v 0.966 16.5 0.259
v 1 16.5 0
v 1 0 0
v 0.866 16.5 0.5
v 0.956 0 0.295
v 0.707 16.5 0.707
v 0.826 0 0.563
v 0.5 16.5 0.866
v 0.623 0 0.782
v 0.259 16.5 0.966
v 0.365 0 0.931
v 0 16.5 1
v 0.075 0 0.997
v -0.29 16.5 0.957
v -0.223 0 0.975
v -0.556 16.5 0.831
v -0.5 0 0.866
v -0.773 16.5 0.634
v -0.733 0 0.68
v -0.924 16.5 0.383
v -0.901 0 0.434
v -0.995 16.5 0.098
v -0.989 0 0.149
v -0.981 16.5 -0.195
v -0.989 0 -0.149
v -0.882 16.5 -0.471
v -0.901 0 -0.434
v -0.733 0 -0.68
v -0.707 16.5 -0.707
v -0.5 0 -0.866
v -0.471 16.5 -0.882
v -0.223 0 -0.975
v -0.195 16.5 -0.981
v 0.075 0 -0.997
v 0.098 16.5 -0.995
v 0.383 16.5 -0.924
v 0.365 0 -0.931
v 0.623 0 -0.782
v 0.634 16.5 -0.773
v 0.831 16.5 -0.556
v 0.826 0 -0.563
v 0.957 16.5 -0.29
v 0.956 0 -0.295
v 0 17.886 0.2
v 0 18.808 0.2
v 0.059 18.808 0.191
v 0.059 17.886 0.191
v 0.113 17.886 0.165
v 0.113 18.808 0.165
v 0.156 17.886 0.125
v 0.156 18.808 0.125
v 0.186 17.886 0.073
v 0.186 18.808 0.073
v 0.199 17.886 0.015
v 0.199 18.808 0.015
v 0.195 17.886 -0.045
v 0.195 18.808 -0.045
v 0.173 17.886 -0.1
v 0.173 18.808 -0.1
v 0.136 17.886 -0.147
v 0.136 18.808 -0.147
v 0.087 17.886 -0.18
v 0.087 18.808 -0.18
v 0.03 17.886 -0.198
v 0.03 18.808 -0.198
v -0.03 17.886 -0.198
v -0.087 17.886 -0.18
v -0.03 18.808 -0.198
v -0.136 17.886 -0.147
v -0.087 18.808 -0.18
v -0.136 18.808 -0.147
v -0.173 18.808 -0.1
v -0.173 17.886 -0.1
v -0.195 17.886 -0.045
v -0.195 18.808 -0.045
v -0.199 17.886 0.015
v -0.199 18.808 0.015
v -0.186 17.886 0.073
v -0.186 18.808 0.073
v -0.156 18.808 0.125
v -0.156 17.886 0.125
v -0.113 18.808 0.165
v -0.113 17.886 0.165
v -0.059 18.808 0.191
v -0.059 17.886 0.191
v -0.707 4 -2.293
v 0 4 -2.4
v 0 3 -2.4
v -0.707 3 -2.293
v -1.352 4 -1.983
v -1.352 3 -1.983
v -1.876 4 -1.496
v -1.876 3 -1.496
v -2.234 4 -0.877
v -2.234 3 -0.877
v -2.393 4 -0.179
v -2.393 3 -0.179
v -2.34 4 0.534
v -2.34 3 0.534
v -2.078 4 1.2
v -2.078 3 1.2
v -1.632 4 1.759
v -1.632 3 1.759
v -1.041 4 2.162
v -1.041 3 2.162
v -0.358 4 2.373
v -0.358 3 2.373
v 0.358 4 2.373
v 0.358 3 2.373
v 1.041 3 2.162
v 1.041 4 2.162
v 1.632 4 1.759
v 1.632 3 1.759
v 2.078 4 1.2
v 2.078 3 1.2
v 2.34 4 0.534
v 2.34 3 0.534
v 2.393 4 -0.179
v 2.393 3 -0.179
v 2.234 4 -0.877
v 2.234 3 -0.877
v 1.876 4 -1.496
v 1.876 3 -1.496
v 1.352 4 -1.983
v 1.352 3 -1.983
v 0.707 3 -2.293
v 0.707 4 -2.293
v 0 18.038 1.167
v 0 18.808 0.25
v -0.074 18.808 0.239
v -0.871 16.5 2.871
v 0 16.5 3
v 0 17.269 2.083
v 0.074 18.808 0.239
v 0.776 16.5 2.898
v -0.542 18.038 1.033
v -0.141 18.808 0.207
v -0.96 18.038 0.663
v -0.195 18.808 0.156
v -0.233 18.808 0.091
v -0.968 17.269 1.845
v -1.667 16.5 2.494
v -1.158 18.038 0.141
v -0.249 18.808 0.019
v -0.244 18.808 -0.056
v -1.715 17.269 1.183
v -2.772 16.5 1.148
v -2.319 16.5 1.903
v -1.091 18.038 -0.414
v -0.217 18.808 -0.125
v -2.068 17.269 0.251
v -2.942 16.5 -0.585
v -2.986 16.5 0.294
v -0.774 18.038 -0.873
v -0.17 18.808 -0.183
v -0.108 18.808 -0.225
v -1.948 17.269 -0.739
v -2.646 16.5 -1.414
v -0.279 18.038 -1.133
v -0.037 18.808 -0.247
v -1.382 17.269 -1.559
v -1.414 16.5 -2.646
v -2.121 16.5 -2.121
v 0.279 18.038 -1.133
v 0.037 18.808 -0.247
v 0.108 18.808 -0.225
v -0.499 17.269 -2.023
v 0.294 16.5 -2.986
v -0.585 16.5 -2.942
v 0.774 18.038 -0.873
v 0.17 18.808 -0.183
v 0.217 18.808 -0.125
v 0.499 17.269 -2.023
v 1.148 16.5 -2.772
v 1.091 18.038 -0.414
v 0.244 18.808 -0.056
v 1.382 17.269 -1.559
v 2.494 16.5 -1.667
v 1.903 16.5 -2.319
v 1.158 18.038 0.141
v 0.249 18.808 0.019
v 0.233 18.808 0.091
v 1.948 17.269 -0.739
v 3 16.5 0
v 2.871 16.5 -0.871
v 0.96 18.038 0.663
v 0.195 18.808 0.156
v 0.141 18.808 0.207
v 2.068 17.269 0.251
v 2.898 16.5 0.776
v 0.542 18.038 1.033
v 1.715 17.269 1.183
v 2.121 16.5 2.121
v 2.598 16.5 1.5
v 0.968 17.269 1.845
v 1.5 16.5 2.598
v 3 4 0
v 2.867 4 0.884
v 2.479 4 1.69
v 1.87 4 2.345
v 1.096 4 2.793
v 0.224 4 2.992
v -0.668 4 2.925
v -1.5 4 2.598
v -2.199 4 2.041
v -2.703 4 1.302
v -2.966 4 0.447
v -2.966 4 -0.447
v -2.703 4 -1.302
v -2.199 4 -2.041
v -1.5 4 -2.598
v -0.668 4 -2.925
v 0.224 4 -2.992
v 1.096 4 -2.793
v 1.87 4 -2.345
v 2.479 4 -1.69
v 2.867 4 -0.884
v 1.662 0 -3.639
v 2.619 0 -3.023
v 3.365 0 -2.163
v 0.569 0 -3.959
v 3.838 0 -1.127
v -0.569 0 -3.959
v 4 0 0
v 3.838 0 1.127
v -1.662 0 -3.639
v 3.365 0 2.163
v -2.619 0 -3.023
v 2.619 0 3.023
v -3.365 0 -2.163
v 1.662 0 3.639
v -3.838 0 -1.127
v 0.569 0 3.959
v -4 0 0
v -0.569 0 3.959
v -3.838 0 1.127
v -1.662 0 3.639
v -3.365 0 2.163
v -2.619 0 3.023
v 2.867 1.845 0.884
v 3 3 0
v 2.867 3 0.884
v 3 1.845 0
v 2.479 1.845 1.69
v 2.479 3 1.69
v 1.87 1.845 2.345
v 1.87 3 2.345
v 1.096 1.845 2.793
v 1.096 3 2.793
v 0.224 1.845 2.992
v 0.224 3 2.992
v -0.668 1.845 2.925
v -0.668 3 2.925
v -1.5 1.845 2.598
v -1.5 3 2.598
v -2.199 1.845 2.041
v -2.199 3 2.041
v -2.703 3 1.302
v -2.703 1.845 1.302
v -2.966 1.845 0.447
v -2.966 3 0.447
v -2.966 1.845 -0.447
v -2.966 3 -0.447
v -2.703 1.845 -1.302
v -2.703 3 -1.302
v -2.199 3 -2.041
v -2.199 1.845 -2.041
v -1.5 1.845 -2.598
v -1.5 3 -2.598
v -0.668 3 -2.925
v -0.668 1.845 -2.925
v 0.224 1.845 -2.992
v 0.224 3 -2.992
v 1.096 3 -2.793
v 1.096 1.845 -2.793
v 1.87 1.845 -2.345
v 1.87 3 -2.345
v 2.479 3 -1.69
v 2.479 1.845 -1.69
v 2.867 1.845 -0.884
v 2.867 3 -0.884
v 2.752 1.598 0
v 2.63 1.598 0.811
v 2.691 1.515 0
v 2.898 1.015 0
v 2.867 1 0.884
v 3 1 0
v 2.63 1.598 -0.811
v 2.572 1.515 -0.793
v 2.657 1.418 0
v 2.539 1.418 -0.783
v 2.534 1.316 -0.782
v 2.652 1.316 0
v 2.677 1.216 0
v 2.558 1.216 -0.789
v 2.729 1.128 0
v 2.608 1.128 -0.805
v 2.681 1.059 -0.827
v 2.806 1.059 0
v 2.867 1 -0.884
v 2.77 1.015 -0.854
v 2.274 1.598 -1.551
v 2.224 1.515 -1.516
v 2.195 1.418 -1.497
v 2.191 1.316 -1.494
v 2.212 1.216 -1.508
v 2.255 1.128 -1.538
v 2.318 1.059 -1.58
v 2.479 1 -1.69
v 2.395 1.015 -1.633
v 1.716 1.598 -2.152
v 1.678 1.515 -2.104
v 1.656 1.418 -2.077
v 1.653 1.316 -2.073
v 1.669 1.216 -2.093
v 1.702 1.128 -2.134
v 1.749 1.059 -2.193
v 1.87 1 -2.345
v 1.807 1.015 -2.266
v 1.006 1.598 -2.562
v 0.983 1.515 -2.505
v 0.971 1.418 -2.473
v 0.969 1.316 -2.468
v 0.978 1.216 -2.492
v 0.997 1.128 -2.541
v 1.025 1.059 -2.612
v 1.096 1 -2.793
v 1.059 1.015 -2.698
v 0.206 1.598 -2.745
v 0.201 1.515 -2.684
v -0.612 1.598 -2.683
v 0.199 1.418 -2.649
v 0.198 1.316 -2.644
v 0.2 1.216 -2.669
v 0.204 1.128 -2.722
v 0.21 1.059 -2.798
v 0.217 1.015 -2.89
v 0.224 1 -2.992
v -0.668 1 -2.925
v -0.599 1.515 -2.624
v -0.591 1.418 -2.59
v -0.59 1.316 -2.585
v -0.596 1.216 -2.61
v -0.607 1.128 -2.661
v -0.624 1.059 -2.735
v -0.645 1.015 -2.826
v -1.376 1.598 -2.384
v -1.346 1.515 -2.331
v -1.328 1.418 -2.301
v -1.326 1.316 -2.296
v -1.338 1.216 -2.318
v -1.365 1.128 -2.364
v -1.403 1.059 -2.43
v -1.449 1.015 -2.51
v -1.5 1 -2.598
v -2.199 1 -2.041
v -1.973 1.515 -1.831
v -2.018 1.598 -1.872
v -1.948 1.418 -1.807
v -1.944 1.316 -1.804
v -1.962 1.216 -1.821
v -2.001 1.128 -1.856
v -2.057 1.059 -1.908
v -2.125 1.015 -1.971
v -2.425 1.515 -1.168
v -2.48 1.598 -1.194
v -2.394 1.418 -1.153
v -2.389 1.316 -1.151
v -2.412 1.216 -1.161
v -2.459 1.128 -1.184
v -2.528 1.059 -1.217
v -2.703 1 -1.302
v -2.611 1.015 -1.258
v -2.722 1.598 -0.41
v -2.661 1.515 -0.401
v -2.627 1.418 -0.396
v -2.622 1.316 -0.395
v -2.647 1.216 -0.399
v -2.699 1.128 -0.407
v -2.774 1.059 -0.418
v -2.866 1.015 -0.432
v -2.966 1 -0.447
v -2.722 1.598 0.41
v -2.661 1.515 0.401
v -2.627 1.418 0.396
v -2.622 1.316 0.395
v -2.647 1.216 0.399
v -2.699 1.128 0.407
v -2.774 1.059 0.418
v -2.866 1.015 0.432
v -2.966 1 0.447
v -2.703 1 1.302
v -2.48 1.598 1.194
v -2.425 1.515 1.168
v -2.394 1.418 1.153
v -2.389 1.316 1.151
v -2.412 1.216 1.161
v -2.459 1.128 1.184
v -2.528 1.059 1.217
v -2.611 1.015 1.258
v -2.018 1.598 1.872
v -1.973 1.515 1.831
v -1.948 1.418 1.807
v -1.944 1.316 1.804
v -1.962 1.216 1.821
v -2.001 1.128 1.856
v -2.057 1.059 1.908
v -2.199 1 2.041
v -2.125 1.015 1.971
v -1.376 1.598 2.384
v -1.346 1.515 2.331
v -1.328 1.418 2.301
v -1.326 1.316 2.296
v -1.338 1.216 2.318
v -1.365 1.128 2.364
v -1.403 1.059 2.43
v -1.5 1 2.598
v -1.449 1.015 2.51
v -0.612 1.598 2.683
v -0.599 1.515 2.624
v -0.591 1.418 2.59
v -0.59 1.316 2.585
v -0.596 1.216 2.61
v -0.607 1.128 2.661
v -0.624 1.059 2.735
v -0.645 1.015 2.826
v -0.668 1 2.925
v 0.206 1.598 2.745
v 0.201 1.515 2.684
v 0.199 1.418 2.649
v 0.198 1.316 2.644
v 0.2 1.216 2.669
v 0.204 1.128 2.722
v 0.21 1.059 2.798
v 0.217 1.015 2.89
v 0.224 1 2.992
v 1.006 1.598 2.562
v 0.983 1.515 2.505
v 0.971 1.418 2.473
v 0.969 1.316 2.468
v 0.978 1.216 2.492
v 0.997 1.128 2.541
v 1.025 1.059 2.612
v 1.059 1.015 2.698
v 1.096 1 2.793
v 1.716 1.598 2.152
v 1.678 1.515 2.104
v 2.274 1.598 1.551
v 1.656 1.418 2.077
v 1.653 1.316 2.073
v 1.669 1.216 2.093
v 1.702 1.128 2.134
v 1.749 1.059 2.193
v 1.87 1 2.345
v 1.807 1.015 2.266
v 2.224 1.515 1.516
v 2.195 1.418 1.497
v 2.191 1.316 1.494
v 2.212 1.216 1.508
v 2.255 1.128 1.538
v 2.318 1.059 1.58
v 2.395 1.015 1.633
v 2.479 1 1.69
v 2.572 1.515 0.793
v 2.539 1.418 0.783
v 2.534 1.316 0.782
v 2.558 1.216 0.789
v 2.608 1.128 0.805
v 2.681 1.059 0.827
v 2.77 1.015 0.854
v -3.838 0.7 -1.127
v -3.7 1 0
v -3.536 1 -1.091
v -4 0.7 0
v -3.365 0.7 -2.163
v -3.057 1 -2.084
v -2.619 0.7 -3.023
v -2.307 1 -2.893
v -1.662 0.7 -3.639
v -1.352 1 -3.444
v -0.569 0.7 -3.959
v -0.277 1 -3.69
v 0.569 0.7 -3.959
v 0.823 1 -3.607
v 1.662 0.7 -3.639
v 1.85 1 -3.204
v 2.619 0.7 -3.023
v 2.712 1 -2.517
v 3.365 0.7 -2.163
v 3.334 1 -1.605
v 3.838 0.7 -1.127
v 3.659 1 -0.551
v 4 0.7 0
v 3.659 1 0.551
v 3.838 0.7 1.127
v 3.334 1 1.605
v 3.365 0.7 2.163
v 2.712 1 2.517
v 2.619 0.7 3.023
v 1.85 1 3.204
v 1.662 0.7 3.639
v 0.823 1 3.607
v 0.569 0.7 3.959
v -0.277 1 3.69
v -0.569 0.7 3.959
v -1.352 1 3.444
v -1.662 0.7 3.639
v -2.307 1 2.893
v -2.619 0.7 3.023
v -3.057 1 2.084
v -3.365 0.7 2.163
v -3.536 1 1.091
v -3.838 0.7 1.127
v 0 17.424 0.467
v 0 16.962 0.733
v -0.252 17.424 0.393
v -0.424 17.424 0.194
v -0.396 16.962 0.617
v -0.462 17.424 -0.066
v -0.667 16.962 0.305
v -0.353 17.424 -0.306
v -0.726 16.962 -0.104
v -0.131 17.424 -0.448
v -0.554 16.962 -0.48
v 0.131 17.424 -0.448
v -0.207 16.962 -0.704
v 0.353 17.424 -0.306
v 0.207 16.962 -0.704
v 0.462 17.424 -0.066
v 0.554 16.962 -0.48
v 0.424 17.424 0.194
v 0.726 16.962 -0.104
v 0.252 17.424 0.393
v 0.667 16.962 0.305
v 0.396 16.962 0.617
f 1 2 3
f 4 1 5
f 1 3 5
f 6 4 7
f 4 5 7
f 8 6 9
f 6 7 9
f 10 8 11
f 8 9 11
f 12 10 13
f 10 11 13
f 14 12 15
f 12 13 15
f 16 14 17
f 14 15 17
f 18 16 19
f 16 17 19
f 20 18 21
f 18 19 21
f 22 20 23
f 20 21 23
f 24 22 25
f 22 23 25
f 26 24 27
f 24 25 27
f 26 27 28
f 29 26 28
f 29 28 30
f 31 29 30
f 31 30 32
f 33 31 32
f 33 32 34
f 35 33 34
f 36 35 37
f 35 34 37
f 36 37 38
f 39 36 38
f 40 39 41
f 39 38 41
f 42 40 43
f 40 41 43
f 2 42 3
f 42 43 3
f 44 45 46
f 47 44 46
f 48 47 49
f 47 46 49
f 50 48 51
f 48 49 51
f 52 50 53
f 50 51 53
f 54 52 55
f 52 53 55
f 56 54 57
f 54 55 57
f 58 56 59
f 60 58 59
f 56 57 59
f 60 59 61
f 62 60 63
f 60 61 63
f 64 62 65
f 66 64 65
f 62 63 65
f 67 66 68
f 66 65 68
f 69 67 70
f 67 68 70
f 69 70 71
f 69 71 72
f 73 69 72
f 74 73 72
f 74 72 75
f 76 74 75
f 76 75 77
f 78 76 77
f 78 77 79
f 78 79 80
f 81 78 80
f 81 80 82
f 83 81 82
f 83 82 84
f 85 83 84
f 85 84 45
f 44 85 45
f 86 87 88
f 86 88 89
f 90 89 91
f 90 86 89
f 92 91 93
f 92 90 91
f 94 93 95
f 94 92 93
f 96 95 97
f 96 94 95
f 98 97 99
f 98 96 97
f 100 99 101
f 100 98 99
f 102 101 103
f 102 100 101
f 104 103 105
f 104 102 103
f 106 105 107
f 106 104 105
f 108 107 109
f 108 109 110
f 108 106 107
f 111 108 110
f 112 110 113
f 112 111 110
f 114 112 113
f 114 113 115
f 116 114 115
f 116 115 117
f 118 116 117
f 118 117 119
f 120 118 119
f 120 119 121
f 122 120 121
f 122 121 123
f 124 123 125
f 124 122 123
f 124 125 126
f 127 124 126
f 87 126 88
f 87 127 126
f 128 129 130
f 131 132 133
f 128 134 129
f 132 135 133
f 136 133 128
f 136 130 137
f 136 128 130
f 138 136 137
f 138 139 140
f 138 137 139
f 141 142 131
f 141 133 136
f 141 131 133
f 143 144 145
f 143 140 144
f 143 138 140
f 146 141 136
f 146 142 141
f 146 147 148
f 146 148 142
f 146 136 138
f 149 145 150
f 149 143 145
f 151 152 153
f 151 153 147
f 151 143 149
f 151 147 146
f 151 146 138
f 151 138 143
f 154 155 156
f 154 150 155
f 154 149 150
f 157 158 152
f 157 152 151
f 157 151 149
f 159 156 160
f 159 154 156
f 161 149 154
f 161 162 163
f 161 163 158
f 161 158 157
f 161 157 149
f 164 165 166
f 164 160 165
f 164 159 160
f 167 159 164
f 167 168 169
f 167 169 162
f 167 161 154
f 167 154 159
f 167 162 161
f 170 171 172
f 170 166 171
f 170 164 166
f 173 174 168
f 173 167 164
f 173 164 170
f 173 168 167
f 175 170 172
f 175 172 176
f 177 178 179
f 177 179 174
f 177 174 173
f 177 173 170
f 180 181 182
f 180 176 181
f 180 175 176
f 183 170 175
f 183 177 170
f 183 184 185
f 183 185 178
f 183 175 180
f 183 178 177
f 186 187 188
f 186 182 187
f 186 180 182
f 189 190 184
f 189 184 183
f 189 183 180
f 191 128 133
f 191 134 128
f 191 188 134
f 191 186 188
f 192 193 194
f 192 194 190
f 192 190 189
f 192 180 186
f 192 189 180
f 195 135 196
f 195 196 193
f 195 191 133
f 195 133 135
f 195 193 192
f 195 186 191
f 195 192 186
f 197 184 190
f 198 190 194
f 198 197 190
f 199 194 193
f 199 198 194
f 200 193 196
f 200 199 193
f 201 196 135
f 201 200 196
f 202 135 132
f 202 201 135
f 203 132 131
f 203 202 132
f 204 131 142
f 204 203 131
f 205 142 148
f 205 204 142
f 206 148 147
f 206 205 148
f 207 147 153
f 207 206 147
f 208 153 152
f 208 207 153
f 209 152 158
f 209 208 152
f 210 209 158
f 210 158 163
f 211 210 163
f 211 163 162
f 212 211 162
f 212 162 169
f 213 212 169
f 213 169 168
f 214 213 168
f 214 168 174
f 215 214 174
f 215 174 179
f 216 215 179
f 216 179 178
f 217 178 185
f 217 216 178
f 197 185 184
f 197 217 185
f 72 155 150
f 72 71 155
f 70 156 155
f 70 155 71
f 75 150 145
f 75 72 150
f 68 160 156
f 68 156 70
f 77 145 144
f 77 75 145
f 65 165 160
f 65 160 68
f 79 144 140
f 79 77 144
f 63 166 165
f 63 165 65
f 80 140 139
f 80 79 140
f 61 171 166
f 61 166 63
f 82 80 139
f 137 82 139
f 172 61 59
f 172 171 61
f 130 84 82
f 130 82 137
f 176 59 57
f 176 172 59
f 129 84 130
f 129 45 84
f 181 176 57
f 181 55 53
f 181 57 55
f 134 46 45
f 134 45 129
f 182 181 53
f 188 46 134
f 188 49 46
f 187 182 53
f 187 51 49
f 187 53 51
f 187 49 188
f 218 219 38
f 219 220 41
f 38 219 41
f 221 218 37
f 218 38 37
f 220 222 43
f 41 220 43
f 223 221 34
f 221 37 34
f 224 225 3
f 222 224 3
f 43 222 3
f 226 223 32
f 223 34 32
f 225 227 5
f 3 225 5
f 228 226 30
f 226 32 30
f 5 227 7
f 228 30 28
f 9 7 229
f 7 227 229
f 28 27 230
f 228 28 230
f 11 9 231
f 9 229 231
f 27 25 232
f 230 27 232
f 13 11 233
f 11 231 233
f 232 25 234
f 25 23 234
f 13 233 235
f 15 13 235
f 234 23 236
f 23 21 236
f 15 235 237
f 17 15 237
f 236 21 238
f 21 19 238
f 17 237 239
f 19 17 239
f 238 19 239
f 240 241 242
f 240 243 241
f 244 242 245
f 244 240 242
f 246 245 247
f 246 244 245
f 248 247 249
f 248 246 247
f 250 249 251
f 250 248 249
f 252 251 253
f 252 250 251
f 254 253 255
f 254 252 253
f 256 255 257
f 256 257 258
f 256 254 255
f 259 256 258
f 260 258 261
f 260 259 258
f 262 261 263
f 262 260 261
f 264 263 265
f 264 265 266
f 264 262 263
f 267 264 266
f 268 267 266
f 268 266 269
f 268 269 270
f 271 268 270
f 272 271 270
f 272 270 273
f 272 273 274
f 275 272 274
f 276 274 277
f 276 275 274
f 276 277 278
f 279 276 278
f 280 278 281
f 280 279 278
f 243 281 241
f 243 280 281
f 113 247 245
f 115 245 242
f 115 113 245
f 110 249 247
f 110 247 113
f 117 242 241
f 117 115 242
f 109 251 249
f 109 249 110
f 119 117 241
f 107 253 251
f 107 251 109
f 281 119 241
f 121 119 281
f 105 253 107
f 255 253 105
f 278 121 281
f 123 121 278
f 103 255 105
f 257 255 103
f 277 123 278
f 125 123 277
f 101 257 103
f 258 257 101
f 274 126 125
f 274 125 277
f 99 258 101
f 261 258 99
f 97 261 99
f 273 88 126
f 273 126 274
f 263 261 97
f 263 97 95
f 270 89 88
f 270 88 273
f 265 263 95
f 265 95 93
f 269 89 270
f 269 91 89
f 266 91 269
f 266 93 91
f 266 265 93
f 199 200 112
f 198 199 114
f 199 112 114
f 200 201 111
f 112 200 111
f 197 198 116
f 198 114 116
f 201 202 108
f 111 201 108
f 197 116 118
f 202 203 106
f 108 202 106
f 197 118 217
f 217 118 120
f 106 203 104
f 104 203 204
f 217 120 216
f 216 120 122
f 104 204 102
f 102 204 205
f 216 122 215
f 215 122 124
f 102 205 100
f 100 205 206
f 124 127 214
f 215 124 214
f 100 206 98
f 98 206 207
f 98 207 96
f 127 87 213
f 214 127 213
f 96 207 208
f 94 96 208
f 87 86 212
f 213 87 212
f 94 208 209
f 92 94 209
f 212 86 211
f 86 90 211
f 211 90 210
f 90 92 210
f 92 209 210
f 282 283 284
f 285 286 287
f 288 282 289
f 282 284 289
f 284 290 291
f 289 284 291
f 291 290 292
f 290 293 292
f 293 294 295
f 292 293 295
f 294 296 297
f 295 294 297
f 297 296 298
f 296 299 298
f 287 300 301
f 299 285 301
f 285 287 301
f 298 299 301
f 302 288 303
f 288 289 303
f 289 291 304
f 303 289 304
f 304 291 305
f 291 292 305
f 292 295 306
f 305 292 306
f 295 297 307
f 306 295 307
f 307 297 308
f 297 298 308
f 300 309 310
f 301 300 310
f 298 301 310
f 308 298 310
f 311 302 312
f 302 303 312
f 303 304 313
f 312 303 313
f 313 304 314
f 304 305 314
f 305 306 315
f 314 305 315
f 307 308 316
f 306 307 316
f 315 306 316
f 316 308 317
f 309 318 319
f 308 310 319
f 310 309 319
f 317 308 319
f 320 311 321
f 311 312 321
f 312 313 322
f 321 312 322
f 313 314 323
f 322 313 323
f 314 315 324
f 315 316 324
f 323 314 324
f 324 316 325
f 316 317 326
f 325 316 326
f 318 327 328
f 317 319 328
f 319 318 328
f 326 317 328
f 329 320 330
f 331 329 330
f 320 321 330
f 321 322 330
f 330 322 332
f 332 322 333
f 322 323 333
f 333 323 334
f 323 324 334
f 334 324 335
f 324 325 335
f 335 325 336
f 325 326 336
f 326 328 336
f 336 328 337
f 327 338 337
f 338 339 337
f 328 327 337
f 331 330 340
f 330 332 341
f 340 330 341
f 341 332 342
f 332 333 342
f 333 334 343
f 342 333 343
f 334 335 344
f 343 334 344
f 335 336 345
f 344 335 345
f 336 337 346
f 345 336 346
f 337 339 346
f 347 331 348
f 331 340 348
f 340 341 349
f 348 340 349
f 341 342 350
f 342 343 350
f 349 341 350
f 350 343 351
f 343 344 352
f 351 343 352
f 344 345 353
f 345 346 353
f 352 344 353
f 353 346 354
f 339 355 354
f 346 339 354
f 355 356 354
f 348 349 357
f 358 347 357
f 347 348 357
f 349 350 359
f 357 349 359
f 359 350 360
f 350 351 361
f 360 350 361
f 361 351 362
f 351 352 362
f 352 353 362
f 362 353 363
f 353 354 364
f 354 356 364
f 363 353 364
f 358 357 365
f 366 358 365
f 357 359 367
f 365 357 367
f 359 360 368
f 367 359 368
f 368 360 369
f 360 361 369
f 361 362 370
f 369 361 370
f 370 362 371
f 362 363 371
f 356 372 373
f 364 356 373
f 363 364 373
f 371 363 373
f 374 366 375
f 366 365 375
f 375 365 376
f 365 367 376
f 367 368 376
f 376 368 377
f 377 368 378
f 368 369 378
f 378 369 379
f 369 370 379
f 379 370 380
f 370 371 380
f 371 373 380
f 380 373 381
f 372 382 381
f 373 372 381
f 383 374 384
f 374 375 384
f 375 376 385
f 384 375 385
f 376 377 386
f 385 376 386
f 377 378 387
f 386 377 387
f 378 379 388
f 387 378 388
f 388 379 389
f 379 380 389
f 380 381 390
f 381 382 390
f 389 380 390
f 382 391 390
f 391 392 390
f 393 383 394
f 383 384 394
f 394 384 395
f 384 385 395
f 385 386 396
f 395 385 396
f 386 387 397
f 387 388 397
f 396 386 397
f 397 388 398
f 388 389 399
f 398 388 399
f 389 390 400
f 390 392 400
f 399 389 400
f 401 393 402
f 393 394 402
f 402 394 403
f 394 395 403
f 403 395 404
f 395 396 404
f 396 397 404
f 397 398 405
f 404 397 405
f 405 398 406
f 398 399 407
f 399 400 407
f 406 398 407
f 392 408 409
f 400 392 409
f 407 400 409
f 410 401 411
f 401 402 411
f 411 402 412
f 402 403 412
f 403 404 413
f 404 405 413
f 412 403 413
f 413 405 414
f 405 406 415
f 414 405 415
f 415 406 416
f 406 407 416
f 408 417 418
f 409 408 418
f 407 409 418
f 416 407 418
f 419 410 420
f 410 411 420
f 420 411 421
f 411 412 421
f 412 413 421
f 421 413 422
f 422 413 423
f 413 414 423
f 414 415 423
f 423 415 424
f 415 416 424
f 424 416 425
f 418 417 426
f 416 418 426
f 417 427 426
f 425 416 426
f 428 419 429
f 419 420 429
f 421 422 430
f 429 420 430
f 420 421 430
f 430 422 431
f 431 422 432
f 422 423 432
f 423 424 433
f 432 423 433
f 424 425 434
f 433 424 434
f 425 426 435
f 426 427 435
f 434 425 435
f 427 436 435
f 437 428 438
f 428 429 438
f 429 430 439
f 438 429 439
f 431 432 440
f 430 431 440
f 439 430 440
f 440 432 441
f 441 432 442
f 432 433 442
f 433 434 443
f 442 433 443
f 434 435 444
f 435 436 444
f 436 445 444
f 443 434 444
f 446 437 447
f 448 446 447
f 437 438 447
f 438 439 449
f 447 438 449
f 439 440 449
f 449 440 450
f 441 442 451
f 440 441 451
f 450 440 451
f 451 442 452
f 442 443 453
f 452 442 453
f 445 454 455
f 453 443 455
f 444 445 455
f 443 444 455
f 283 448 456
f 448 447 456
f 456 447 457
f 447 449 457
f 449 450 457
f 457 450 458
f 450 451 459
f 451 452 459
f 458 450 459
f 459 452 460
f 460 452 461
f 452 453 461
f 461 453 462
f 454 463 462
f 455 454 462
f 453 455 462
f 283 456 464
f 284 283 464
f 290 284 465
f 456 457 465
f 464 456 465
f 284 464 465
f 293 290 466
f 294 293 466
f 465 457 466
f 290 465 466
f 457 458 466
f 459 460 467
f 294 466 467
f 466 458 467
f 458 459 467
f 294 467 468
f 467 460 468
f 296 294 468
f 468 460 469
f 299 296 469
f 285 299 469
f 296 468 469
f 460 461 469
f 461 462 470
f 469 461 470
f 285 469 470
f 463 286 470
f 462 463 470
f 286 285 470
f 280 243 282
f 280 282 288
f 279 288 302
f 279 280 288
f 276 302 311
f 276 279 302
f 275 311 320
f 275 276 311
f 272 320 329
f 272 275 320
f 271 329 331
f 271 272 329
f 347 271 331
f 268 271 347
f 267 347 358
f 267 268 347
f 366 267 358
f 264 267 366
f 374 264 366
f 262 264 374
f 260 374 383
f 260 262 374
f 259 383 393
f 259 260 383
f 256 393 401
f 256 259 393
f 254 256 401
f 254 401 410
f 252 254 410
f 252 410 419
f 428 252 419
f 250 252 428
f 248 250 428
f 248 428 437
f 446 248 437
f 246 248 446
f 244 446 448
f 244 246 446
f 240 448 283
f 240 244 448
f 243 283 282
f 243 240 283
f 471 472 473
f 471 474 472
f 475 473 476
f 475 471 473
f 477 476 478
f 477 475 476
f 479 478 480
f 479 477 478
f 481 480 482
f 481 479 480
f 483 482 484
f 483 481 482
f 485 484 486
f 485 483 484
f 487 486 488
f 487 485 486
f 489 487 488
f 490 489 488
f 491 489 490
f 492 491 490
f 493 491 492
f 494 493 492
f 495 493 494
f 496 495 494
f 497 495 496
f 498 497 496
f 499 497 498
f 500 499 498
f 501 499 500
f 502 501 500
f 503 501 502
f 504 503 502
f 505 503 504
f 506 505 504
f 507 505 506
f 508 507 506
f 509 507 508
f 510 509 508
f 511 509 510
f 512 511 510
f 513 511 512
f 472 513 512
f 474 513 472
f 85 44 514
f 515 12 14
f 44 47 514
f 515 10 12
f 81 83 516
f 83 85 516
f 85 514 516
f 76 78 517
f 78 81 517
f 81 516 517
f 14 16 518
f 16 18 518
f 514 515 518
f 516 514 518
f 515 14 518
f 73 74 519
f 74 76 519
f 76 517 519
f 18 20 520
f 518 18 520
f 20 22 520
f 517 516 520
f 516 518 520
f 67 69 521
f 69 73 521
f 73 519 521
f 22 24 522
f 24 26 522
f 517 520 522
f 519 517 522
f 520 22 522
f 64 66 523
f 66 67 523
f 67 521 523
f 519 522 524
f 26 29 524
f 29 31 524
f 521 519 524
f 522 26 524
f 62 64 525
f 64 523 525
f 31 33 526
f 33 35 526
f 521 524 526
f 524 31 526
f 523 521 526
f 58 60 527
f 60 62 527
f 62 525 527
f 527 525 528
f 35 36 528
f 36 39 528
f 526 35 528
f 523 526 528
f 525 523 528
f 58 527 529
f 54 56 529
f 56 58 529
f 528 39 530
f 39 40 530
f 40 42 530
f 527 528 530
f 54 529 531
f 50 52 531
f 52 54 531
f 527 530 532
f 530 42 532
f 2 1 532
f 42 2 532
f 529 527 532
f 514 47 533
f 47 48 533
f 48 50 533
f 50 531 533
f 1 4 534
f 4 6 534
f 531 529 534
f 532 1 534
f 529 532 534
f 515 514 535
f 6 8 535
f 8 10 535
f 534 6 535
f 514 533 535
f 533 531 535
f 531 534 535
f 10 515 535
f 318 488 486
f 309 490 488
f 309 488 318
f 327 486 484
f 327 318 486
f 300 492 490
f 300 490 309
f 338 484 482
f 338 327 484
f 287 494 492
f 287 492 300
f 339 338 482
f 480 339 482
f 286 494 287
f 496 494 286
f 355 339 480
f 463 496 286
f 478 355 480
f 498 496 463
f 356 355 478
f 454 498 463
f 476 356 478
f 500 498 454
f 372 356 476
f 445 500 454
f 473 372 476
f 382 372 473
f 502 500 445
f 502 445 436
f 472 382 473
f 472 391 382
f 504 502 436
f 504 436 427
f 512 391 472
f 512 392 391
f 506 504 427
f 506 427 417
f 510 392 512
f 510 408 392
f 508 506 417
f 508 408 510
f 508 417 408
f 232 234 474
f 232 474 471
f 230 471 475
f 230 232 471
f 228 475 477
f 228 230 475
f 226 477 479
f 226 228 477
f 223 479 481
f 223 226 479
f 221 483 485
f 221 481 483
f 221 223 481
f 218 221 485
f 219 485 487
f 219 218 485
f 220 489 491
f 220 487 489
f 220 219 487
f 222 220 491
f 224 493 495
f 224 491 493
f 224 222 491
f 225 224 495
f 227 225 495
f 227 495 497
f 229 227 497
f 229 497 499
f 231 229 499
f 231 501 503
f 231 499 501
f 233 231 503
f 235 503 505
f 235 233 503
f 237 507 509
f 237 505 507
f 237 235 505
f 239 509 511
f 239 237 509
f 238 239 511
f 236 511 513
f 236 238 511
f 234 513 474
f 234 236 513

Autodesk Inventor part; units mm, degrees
ref_plane "XZ Plane" through (0, 0, 0) normal (0, 1, 0) x (-1, 0, 0)
sketch "Sketch1" plane through (0, 0, 0) normal (0, 1, 0) x (-1, 0, 0)
  circle A0 centre (0, 0) radius 4
  dimension "d0" = 8
extrude "Extrusion1" add sketch "Sketch1" along normal blind 1
sketch "Sketch2" plane through (0, 1, 0) normal (0, 1, 0) x (1, 0, 0)
  circle A0 centre (0, 0) radius 4 projected
  circle A1 centre (0, 0) radius 3
  dimension "d3" = 6
extrude "Extrusion2" add sketch "Sketch2" along normal blind 15.5 contours A1
sketch "Sketch3" plane through (0, 0, 0) normal (0, -1, 0) x (1, 0, 0)
  circle A0 centre (0, 0) radius 4 projected
  circle A1 centre (0, 0) radius 1
  dimension "d6" = 2
extrude "Extrusion3" cut sketch "Sketch3" against normal blind 21 contours A1
sketch "Sketch4" plane through (0, 0, 0) normal (1, 0, 0) x (0, 1, 0)
  line L0 (1, 3) -> (16.5, 3) projected
  line L1 (1, -3) -> (16.5, -3) projected
  line L2 (0, 0) -> (17, 0)
  line L3 (16.5, 3) -> (18.8075, 0.25)
  line L4 (16.5, -3) -> (16.5, 3) projected
  line L5 (16.5, 0.2) -> (18.8075, 0.2)
  line L6 (17.8856, 0.2) -> (16.5, 1)
  line L7 (0, 1) -> (16.5, 1) projected
  line L8 (16.5, 1) -> (16.5, 3)
  line L9 (18.8075, 0.25) -> (18.8075, 0.2)
  dimension "d9" = 40
  dimension "d10" = 0.2
  dimension "d11" = 30
  dimension "d20" = 0.05
revolve "Revolution1" add sketch "Sketch4" angle 360 about axis through (0, 0, 0) along (0, 1, 0) contours L3 L9 L5 L6 L4
sketch "Sketch5" plane through (0, 0, 0) normal (0, 0, 1) x (1, 0, 0)
  circle A0 centre (3, 1.35) radius 0.35
  line L0 (4, 1) -> (-4, 1) projected
  line L1 (3, 3) -> (3, 0)
  line L2 (0, 1.1204) -> (0, 3)
  line L3 (2.7525, 1.5975) -> (3.3734, 2.2184)
  line L4 (3.3734, 2.2184) -> (3.3499, 1.3406)
  point P0 (0, 0)
  dimension "d14" = 0.7
  dimension "d19" = 45
revolve "Revolution2" cut sketch "Sketch5" angle 360 about axis through (0, 1.1204, 0) along (0, 1, 0)
chamfer "Chamfer1" distance 0.3 angle 45 1 edges at (4, 1, 0)
sketch "Sketch6" plane through (0, 0, 0) normal (1, 0, 0) x (0, 1, 0)
  line L0 (1.845, -3) -> (16.5, -3) projected
  line L1 (4, -3) -> (3, -3)
  line L2 (3, -3) -> (3, -2.4)
  line L3 (3, -2.4) -> (4, -2.4)
  line L4 (4, -2.4) -> (4, -3)
  line L5 (3, 3.882) -> (3, -15) projected
  line L6 (1.845, -3) -> (16.5, -3) projected
  circle A0 centre (-0.2, 0) radius 6.5 projected
  line L7 (0, 0) -> (0.8989, 0)
  dimension "d21" = 1
  dimension "d22" = 0.6
revolve "Revolution3" cut sketch "Sketch6" angle 360 about axis through (0, 0, 0) along (0, 1, 0) contours L2 L3 L4 L0
properties material "Copper"
